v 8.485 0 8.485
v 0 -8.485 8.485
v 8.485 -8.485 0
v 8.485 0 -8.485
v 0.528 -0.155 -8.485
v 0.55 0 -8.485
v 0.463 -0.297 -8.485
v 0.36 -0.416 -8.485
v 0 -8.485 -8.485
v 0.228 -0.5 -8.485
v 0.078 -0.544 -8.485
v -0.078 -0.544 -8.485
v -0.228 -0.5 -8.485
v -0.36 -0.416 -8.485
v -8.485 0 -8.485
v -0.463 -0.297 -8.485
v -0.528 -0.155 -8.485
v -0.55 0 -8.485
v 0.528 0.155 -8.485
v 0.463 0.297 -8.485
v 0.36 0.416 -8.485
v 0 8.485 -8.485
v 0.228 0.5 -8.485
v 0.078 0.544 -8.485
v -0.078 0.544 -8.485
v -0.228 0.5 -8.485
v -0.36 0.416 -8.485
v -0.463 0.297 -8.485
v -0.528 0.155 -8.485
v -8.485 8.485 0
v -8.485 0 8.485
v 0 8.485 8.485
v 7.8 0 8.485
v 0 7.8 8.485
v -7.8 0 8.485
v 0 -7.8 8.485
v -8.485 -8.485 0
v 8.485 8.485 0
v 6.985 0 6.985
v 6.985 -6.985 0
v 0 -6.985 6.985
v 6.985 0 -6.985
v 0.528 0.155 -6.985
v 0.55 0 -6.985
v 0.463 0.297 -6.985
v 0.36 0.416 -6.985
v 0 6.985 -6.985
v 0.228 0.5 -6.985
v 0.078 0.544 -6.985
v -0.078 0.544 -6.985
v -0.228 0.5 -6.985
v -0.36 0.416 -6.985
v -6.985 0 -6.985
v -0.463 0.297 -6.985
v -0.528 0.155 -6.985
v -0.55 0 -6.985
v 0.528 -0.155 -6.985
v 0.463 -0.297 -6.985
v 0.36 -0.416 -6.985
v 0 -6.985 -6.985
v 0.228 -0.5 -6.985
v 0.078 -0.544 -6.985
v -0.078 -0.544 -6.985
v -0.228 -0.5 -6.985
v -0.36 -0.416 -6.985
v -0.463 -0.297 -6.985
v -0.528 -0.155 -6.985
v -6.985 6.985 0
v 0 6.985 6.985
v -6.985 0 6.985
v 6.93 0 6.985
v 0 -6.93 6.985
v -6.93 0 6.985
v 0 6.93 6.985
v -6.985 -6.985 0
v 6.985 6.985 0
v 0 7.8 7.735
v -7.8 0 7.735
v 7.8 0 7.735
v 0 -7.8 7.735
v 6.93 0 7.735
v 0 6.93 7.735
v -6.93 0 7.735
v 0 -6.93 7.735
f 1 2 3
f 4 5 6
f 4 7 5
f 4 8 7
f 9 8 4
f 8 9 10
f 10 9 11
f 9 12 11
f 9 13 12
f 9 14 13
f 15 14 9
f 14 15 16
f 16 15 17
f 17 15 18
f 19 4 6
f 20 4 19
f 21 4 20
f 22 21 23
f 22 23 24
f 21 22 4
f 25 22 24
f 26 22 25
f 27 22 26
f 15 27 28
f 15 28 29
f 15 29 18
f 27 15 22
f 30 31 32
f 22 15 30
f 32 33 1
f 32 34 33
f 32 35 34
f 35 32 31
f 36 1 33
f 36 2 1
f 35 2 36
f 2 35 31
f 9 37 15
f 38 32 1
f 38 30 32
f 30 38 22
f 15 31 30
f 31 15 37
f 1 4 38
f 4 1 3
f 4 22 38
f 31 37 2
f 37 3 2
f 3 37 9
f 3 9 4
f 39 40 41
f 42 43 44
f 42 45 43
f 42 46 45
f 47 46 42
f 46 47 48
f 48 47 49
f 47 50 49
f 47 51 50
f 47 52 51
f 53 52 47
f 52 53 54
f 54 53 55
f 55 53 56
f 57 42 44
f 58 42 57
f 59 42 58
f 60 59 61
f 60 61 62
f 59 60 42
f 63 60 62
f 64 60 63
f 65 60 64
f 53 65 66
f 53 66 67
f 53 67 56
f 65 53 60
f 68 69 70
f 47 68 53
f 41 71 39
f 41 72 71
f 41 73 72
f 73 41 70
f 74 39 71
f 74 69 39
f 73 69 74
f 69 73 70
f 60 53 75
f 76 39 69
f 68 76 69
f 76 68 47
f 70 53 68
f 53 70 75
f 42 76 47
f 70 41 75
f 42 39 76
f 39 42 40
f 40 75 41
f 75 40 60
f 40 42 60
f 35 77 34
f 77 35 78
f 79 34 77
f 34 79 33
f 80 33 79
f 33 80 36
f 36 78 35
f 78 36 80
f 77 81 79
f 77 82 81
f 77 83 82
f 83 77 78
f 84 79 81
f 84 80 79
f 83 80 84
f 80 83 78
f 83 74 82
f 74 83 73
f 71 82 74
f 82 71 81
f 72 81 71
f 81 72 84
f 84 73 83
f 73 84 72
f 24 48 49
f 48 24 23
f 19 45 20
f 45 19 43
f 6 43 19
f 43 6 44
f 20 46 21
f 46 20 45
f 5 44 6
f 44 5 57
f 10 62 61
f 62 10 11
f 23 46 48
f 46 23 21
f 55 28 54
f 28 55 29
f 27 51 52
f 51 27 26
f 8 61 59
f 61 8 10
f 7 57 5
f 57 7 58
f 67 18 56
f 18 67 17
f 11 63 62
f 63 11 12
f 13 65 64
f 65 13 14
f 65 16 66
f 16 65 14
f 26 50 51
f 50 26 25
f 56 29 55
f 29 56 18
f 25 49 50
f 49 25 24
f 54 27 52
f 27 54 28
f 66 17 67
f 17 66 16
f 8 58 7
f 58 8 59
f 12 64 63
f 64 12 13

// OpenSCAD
arete = 12;
paroi = 1.5;
diametreTrouBouchon = 1.5;
bottomHole = 1;
bottomHoleDiameter = 1.1;

echelleReductionAjustementBouchon = 0.94;
r = 0.19; // résolution d'impression sur l'axe Z
Cpi = 3.14159;
Cphi = (1+sqrt(5))/2;
Cepsilon = 0.00000001;


function int_radius(a) =
    a*cos(45);

function arete_from(int_radius) =
    int_radius/cos(45);

externalRadius = arete;
internalRadius = arete_from(int_radius(arete)-paroi);

echo(internalRadius);

//forme_creuse();
//decoupe_bouchon();
corps_ouvert();
// bouchon();
//trou();

module corps_ouvert() {
	difference() {
		forme_creuse();
		decoupe_bouchon();
    if (bottomHole) {
      translate([0, 0, -externalRadius+1])
      #cylinder(paroi*3, r=bottomHoleDiameter/2, $fn=22);
    }
	}
}

module bouchon() {
    // rotate([180, 0, 0])
	scale([echelleReductionAjustementBouchon, echelleReductionAjustementBouchon, 0.98])
	difference () {
        intersection() {
            forme_creuse();
            decoupe_bouchon(echelleReductionAjustementBouchon);
        }
        trou();
	}
}

module trou() {
    rotate([0, 0, 0])
		translate([0, 0, externalRadius*0.5])
		cylinder(30, r=diametreTrouBouchon/2, $fn=22);
}

module forme_creuse() {
	difference() {
        cuboctahedron(externalRadius);
        cuboctahedron(internalRadius);
	}
}

module decoupe_bouchon(scale=1) {
    distance = int_radius(arete);
	rotate([0,0,0]) translate([0,0, distance])
		cylinder(paroi, r=arete*0.65, $fn=4, center=true);
	rotate([0,0,0]) translate([0,0, distance-paroi])
		cylinder(paroi, r=(arete-paroi)*0.66, $fn=4, center=true);
}



module cuboctahedron(radius) {

// Cuboctahedron

// base coordinates
// source:  http://dmccooey.com/polyhedra/Cuboctahedron.txt
// generated by  http://kitwallace.co.uk/3d/solid-to-scad.xq
Name = "Cuboctahedron";
// 4 sided faces = 6
// 3 sided faces = 8
C0 = 0.7071067811865475244008443621048;
points = [
[ C0, 0.0,  C0],
[ C0, 0.0, -C0],
[-C0, 0.0,  C0],
[-C0, 0.0, -C0],
[ C0,  C0, 0.0],
[ C0, -C0, 0.0],
[-C0,  C0, 0.0],
[-C0, -C0, 0.0],
[0.0,  C0,  C0],
[0.0,  C0, -C0],
[0.0, -C0,  C0],
[0.0, -C0, -C0]];
faces = [
[  4 ,  1,  5,  0],
[ 10 ,  2,  8,  0],
[  3 ,  6,  2,  7],
[ 10 ,  5, 11,  7],
[  3 , 11,  1,  9],
[  4 ,  8,  6,  9],
[  8 ,  4,  0],
[ 11 ,  5,  1],
[ 10 ,  7,  2],
[  9 ,  6,  3],
[  9 ,  1,  4],
[ 10 ,  0,  5],
[  8 ,  2,  6],
[ 11 ,  3,  7]];
edges = [
[1,4],
[1,5],
[0,5],
[0,4],
[2,10],
[2,8],
[0,8],
[0,10],
[3,6],
[2,6],
[2,7],
[3,7],
[5,10],
[5,11],
[7,11],
[7,10],
[3,11],
[1,11],
[1,9],
[3,9],
[4,8],
[6,8],
[6,9],
[4,9]];
// ---------------------------------


// cut holes out of shell
eps=0.02;
//radius=12;
shell_ratio=0.1;
prism_base_ratio =0.8;
prism_height_ratio=0.3;
prism_scale=0.5;
nfaces = [];
scale=1;

//insert

spoints = normalize(centre_points(points),radius);
sfaces = lhs_faces(faces,spoints);
cfaces =  select_nsided_faces(sfaces,nfaces);

module shape() {
   difference() {
      polyhedron(spoints,sfaces);
      scale(1-shell_ratio) polyhedron(spoints,sfaces);
     face_prisms_in(cfaces,spoints,prism_base_ratio,prism_scale,prism_height_ratio);
   }
};

scale(scale)
  translate([0, 0, -int_radius(radius)])
    place_on_largest_face(sfaces,spoints)
//    shape();
      polyhedron(spoints,sfaces);
}

// ruler(10);

// functions for the construction of polyhedra
// chris wallace
// see http://kitwallace.tumblr.com/tagged/polyhedra for info


//  functions for creating the matrices for transforming a single point

function m_translate(v) = [ [1, 0, 0, 0],
                            [0, 1, 0, 0],
                            [0, 0, 1, 0],
                            [v.x, v.y, v.z, 1  ] ];

function m_rotate(v) =  [ [1,  0,         0,        0],
                          [0,  cos(v.x),  sin(v.x), 0],
                          [0, -sin(v.x),  cos(v.x), 0],
                          [0,  0,         0,        1] ]
                      * [ [ cos(v.y), 0,  -sin(v.y), 0],
                          [0,         1,  0,        0],
                          [ sin(v.y), 0,  cos(v.y), 0],
                          [0,         0,  0,        1] ]
                      * [ [ cos(v.z),  sin(v.z), 0, 0],
                          [-sin(v.z),  cos(v.z), 0, 0],
                          [ 0,         0,        1, 0],
                          [ 0,         0,        0, 1] ];

function vec3(v) = [v.x, v.y, v.z];
function transform(v, m)  = vec3([v.x, v.y, v.z, 1] * m);

function matrix_to(p0, p) =
                       m_rotate([0, atan2(sqrt(pow(p[0], 2) + pow(p[1], 2)), p[2]), 0])
                     * m_rotate([0, 0, atan2(p[1], p[0])])
                     * m_translate(p0);

function matrix_from(p0, p) =
                      m_translate(-p0)
                      * m_rotate([0, 0, -atan2(p[1], p[0])])
                      * m_rotate([0, -atan2(sqrt(pow(p[0], 2) + pow(p[1], 2)), p[2]), 0]);

function transform_points(list, matrix, i = 0) =
    i < len(list)
       ? concat([ transform(list[i], matrix) ], transform_points(list, matrix, i + 1))
       : [];


//  convert from point indexes to point coordinates

function as_points(indexes,points,i=0) =
     i < len(indexes)
        ?  concat([points[indexes[i]]], as_points(indexes,points,i+1))
        : [];

//  basic vector functions
function normal_r(face) =
     cross(face[1]-face[0],face[2]-face[0]);

function normal(face) =
     - normal_r(face) / norm(normal_r(face));

function centre(points) =
      vsum(points) / len(points);

// sum a list of vectors
function vsum(points,i=0) =
      i < len(points)
        ?  (points[i] + vsum(points,i+1))
        :  [0,0,0];

function ssum(list,i=0) =
      i < len(list)
        ?  (list[i] + ssum(list,i+1))
        :  0;


// add a vector to a list of vectors
function vadd(points,v,i=0) =
      i < len(points)
        ?  concat([points[i] + v], vadd(points,v,i+1))
        :  [];

function reverse_r(v,n) =
      n == 0
        ? [v[0]]
        : concat([v[n]],reverse_r(v,n-1));

function reverse(v) = reverse_r(v, len(v)-1);

function sum_norm(points,i=0) =
    i < len(points)
       ?  norm(points[i]) + sum_norm(points,i+1)
       : 0 ;

function average_radius(points) =
       sum_norm(points) / len(points);


// select one dimension of a list of vectors
function slice(v,k,i=0) =
   i <len(v)
      ?  concat([v[i][k]], slice(v,k,i+1))
      : [];

function max(v, max=-9999999999999999,i=0) =
     i < len(v)
        ?  v[i] > max
            ?  max(v, v[i], i+1 )
            :  max(v, max, i+1 )
        : max;

function min(v, min=9999999999999999,i=0) =
     i < len(v)
        ?  v[i] < min
            ?  min(v, v[i], i+1 )
            :  min(v, min, i+1 )
        : min;

function project(pts,i=0) =
     i < len(pts)
        ? concat([[pts[i][0],pts[i][1]]], project(pts,i+1))
        : [];

function contains(n, list, i=0) =
     i < len(list)
        ?  n == list[i]
           ?  true
           :  contains(n,list,i+1)
        : false;

// normalize the points to have origin at 0,0,0
function centre_points(points) =
     vadd(points, - centre(points));

//scale to average radius = radius
function normalize(points,radius) =
    points * radius /average_radius(points);

function select_nsided_faces(faces,nsides,i=0) =
  len(nsides) == 0
     ?  faces
     :  i < len(faces)
         ?  contains(len(faces[i]), nsides)
             ? concat([faces[i]],  select_nsided_faces(faces,nsides,i+1))
             : select_nsided_faces(faces,nsides,i+1)
         : [];

function longest_edge(face,max=-1,i=0) =
       i < len(face)
          ?  norm(face[i] - face[(i+1)% len(face)]) > max
             ?  longest_edge(face, norm(face[i] - face[(i+1)% len(face)]),i+1)
             :  longest_edge(face, max,i+1)
          : max ;

function point_edges(point,edges,i=0) =
    i < len(edges)
       ? point == edges[i][0] || point == edges[i][1]
         ? concat([edges[i]], point_edges(point,edges,i+1))
         : point_edges(point,edges,i+1)
       : [];

function select_nedged_points(points,edges,nedges,i=0) =
     i < len(points)
         ?  len(point_edges(i,edges)) == nedges
             ? concat([i],  select_nedged_points(points,edges,nedges,i+1))
             : select_nedged_points(points,edges,nedges,i+1)
         : [];

function triangle(a,b) = norm(cross(a,b))/2;

function face_area_centre(face,centre,i=0) =
    i < len(face)
       ?  triangle(
                face[i] - centre,
                face[(i+1) % len(face)] - centre)
          + face_area_centre(face,centre,i+1)
       : 0 ;

function face_area(face) = face_area_centre(face,centre(face));

function face_areas(faces,points,i=0) =
   i < len(faces)
      ? concat([[i,  face_area(as_points(faces[i],points))]] ,
               face_areas(faces,points,i+1))
      : [] ;

function max_area(areas, max=[-1,-1], i=0) =
   i <len(areas)
      ? areas[i][1] > max[1]
         ?  max_area(areas,areas[i],i+1)
         :  max_area(areas,max,i+1)
      : max;


function bbox(v) = [
   [min(slice(spoints,0)), max(slice(spoints,0))],
   [min(slice(spoints,1)), max(slice(spoints,1))],
   [min(slice(spoints,2)), max(slice(spoints,2))]
];

// check that all faces have a lhs orientation
function cosine_between(u, v) =(u * v) / (norm(u) * norm(v));

function lhs_faces(faces,points,i=0) =
     i < len(faces)
        ?  cosine_between(normal(as_points(faces[i],points)),
                         centre(as_points(faces[i],points))) < 0
            ?  concat([reverse(faces[i])],lhs_faces(faces,points,i+1))
            :  concat([faces[i]],lhs_faces(faces,points,i+1))
        : [] ;


function fs(p) = f(p[0],p[1],p[2]);

function modulate_point(p) =
    spherical_to_xyz(fs(xyz_to_spherical(p)));

function modulate_points(points,i=0) =
   i < len(points)
      ? concat([modulate_point(points[i])],modulate_points(points,i+1))
      : [];

function xyz_to_spherical(p) =
    [ norm(p), acos(p.z/ norm(p)), atan2(p.x,p.y)] ;

function spherical_to_xyz_full(r,theta,phi) =
    [ r * sin(theta) * cos(phi),
      r * sin(theta) * sin(phi),
      r * cos(theta)];

function spherical_to_xyz(s) =
     spherical_to_xyz_full(s[0],s[1],s[2]);

function select_large_faces(faces,points, min,i=0) =
  i < len(faces)
     ?  face_area(as_points(faces[i],points)) > min
       ? concat([faces[i]],  select_large_faces(faces,points,min,i+1))
       :select_large_faces(faces,points,min,i+1)
     : [];

function lower(char) =
    contains(char,"abcdefghijklmnopqrstuvwxyz") ;

function char_layer(char) =
    lower(char)
         ? str(char,"_")
         : char;

module write_char(font,char) {
	linear_extrude(height=1,convexity=10)
      import(file=str("write/",font,".dxf"),layer=char_layer(char));
}

module write_centred_char(font,char) {
	linear_extrude(height=1,convexity=10)
      translate([-2.5,-4,0])
          import(file=str("write/",font,".dxf"),layer=char_layer(char));
}

module engrave_face_word(faces,points,word,font,ratio,thickness) {
    for (i=[0:len(faces) - 1]) {
      if (i <len(word)) {
        f = as_points(faces[i], points);
        n = normal(f); c = centre(f);
        s = longest_edge(f) / 20* ratio;
          orient_to(c,n)
            translate([0,0,-thickness+eps])
              scale([s,s,thickness])
                write_centred_char(font,word[i]);
      }
    }
}

module orient_to(centre, normal) {
    translate(centre)
    rotate([0, 0, atan2(normal[1], normal[0])]) //rotation
    rotate([0, atan2(sqrt(pow(normal[0], 2)+pow(normal[1], 2)),normal[2]), 0])
    children();
}

module orient_from(centre, normal) {
    rotate([0, -atan2(sqrt(pow(normal[0], 2)+pow(normal[1], 2)),normal[2]), 0])
    rotate([0, 0, -atan2(normal[1], normal[0])]) //rotation
    translate(-centre)
    children();
}

module place_on_largest_face(faces,points) {
    largest = max_area(face_areas(faces,points));
    lpoints = as_points(faces[largest[0]],points);
    n = normal(lpoints); c = centre(lpoints);
    orient_from(c,-n)
    children();
}

module make_edge(edge, points, r) {
    p0 = points[edge[0]]; p1 = points[edge[1]];
    v = p1 - p0;
     orient_to(p0,v)
       cylinder(r=r, h=norm(v));
}

module make_edges(points, edges, r) {
   for (i =[0:len(edges)-1])
      make_edge(edges[i],points, r);
}

module make_vertices(points,r) {
   for (i = [0:len(points)-1])
      translate(points[i]) sphere(r);
}

module face_prism (face,prism_base_ratio,prism_scale,prism_height_ratio) {
    n = normal(face); c= centre(face);
    m = matrix_from(c,n);
    tpts =  prism_base_ratio * transform_points(face,m);
    max_length = longest_edge(face);
    xy = project(tpts);
      linear_extrude(height=prism_height_ratio * max_length, scale=prism_scale)
          polygon(points=xy);
}

module face_prisms_in(faces,points,prism_base_ratio,prism_scale,prism_height_ratio) {
    for (i=[0:len(faces) - 1]) {
       f = as_points(faces[i],points);
       n = normal(f); c = centre(f);
       orient_to(c,n)
          translate([0,0,eps])
               mirror() rotate([0,180,0])
                   face_prism(f,prism_base_ratio,prism_scale,prism_height_ratio);
    }
}

module face_prisms_out(faces,points,prism_base_ratio,prism_scale,prism_height_ratio) {
    for (i=[0:len(faces) - 1]) {
       f = as_points(faces[i],points);
       n = normal(f); c = centre(f);
       orient_to(c,n)
          translate([0,0,-eps])
               face_prism(f,prism_base_ratio,prism_scale,prism_height_ratio);
    }
}

module face_prisms_through(faces,points,prism_base_ratio,prism_scale,prism_height_ratio) {
    for (i=[0:len(faces) - 1]) {
       f = as_points(faces[i],points);
       n = normal(f); c = centre(f);
       orient_to(c,n)
          translate([0,0,prism_height_ratio*longest_edge(f)/2])
               mirror() rotate([0,180,0])
                   face_prism(f,prism_base_ratio,prism_scale,prism_height_ratio);
    }
}
module ruler(n) {
   for (i=[0:n-1])
       translate([(i-n/2 +0.5)* 10,0,0]) cube([9.8,5,2], center=true);
}

module ground(size=50) {
   translate([0,0,-size]) cube(2*size,center=true);
}

module cross_section(size=50) {
   translate([0,0,-size]) cube(2*size);
}

module ring(radius,thickness,height) {
   difference() {
      cylinder(h=height,r=radius);
      translate([0,0,-eps]) cylinder(h=height+2*eps,r=radius - thickness);
   }
}
